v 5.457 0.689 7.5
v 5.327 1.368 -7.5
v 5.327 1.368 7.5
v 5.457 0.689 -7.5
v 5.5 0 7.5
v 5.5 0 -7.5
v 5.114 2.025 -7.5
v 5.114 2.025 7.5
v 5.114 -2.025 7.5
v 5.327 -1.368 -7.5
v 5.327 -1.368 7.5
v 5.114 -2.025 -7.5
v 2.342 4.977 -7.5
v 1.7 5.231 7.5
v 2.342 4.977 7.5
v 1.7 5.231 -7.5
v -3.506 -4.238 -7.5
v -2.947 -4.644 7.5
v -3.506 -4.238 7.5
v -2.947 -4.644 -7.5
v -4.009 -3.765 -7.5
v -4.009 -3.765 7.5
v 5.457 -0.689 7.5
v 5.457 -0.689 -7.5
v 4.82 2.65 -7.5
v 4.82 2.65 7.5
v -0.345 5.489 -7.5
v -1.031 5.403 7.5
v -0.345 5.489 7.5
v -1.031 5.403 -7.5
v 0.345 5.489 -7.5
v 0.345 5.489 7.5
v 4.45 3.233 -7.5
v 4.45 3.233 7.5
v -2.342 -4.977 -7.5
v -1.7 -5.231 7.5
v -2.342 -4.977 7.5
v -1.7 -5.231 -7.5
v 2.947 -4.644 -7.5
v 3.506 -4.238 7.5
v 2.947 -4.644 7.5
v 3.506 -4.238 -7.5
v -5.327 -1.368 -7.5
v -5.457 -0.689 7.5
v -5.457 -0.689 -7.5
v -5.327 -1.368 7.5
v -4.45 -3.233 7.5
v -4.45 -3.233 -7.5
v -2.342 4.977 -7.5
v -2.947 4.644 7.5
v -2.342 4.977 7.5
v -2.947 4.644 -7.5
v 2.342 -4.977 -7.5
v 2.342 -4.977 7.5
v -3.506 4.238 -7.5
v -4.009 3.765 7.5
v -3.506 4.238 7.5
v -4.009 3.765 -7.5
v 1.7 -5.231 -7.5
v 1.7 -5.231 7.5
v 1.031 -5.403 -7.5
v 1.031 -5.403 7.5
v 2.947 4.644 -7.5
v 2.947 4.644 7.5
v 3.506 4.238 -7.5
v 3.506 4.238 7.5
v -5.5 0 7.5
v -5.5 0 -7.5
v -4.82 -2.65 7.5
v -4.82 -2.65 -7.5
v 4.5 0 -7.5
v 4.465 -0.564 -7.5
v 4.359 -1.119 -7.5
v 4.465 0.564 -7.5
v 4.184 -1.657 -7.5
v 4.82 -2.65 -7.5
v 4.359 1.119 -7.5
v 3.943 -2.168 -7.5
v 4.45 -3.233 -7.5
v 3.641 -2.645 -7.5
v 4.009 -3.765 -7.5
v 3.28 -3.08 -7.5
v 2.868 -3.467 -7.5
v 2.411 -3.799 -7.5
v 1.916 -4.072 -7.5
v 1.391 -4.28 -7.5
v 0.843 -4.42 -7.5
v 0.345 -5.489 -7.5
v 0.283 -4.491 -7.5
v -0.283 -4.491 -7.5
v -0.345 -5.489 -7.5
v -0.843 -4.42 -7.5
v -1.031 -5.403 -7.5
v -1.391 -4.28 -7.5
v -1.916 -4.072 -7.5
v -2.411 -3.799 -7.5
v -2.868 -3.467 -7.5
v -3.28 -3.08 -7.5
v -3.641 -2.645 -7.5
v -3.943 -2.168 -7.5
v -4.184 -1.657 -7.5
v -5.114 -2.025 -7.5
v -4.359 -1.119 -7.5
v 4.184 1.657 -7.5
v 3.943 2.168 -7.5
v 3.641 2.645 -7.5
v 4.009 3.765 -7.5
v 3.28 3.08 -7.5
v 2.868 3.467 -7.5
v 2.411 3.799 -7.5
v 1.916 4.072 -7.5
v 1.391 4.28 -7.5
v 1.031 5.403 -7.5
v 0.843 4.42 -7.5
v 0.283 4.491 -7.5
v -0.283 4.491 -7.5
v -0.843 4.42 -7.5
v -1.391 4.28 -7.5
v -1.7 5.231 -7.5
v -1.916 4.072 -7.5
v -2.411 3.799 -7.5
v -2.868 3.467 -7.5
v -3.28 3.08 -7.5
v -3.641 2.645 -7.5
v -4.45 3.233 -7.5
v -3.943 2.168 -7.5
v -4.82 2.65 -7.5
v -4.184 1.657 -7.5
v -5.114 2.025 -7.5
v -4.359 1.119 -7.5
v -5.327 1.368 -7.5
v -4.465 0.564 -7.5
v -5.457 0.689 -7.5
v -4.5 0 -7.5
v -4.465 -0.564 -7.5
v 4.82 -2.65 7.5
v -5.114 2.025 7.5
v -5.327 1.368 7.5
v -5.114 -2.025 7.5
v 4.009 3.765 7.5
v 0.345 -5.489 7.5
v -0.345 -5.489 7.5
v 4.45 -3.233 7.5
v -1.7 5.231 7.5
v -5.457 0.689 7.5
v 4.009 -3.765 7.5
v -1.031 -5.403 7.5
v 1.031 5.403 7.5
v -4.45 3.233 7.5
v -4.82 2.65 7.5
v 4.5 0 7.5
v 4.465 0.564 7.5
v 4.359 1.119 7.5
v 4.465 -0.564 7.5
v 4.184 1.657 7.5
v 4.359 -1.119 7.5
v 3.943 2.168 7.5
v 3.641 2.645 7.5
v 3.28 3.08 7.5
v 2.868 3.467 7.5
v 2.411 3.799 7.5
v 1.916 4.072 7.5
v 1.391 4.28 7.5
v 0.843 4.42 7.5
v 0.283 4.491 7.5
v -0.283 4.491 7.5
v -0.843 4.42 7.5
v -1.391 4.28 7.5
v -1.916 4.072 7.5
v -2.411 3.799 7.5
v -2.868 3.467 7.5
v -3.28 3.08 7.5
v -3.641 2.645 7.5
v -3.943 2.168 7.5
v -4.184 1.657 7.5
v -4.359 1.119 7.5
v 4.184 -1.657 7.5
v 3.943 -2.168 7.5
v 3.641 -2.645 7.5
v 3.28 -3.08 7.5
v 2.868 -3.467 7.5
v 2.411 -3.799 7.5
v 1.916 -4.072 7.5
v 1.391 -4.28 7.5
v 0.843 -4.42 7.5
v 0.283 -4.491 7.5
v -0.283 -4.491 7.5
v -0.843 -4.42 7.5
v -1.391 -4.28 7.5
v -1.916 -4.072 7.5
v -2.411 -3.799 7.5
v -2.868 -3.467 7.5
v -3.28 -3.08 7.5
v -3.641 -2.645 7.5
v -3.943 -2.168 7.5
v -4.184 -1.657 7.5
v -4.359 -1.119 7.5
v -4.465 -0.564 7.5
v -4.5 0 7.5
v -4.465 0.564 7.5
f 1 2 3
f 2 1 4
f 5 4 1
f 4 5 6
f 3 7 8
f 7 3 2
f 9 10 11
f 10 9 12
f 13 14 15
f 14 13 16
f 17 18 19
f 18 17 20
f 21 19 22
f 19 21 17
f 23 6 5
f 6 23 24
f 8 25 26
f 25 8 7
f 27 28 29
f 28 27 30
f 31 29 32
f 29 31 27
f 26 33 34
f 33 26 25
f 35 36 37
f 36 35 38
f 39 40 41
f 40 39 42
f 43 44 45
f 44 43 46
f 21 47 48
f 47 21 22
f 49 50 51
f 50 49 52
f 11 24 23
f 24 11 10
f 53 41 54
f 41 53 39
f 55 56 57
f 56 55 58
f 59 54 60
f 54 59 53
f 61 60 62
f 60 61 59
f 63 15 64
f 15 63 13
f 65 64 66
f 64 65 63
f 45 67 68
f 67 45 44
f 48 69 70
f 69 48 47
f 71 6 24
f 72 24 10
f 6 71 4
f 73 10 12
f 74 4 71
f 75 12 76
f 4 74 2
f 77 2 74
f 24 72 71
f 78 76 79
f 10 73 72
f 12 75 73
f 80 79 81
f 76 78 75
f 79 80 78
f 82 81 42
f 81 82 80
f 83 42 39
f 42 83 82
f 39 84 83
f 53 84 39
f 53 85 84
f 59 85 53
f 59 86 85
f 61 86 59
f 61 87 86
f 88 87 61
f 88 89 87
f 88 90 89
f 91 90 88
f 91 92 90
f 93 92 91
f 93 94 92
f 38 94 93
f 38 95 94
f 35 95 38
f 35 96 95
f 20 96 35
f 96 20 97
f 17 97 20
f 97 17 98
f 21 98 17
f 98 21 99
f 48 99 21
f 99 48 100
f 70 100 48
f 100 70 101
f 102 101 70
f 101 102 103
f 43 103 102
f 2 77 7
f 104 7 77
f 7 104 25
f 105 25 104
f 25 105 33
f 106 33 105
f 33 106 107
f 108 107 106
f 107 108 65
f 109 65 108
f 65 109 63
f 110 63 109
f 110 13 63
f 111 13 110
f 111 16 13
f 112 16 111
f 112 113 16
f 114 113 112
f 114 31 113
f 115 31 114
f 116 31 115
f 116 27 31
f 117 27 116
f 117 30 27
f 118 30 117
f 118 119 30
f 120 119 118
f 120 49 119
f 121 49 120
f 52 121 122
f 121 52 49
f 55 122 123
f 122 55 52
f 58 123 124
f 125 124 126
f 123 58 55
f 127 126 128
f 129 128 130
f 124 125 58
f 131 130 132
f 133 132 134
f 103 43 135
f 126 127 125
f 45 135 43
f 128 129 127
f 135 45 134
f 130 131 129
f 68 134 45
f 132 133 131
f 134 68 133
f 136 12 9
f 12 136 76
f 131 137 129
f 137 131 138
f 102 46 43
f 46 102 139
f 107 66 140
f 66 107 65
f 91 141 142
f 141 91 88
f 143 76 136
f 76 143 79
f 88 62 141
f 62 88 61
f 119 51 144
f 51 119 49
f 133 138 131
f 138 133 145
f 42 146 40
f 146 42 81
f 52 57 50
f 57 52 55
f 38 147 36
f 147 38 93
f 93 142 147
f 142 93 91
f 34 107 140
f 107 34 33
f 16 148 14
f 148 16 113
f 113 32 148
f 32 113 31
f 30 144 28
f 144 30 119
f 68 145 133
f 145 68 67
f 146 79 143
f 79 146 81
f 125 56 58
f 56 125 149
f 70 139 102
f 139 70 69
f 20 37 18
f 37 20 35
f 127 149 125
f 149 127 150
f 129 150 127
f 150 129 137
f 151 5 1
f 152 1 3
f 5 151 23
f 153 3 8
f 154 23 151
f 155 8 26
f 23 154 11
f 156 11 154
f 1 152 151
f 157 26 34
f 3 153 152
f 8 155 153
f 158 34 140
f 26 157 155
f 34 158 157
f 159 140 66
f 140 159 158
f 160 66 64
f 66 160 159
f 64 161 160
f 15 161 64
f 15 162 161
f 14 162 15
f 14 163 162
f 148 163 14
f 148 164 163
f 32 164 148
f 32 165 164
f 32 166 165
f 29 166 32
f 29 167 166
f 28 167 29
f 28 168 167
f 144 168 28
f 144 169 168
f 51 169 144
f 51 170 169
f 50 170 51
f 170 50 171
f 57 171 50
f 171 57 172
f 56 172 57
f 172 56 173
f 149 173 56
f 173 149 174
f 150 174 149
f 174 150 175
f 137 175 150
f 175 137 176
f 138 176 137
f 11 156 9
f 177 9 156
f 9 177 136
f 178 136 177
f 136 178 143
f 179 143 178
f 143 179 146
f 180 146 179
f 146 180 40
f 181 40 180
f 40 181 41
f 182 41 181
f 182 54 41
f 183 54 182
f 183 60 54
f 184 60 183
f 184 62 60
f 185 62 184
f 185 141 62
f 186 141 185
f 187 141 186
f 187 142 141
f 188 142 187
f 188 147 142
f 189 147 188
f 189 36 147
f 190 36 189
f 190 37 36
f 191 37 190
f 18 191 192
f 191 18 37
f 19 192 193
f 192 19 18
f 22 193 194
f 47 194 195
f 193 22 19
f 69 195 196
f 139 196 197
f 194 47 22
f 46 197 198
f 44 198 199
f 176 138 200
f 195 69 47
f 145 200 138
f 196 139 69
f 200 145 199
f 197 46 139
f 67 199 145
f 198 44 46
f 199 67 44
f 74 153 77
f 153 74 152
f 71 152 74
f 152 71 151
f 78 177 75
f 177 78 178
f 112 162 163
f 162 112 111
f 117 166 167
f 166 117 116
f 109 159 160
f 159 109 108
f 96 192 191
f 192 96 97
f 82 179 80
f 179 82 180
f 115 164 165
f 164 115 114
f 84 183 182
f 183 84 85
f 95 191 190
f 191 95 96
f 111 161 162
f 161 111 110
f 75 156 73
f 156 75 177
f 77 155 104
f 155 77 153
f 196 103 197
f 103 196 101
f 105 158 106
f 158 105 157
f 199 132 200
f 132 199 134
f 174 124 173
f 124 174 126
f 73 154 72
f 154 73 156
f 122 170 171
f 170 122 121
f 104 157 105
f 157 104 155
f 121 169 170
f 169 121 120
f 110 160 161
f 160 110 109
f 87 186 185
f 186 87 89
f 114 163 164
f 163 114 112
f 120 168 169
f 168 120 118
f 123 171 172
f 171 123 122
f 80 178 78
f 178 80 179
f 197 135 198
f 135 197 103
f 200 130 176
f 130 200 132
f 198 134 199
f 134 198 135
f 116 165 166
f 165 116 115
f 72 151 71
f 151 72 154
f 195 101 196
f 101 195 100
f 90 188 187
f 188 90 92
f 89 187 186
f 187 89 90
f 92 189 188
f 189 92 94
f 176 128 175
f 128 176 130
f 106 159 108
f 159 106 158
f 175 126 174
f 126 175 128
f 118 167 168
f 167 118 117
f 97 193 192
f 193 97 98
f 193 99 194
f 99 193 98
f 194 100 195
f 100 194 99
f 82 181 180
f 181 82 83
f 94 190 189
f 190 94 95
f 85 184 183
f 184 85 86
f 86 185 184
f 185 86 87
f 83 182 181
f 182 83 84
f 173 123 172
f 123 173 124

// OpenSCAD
$fn = 50;


difference() {
	union() {
		translate(v = [0, 0, -7.5000000000]) {
			cylinder(h = 15, r = 5.5000000000);
		}
	}
	union() {
		translate(v = [0, 0, -100.0000000000]) {
			cylinder(h = 200, r = 4.5000000000);
		}
	}
}
